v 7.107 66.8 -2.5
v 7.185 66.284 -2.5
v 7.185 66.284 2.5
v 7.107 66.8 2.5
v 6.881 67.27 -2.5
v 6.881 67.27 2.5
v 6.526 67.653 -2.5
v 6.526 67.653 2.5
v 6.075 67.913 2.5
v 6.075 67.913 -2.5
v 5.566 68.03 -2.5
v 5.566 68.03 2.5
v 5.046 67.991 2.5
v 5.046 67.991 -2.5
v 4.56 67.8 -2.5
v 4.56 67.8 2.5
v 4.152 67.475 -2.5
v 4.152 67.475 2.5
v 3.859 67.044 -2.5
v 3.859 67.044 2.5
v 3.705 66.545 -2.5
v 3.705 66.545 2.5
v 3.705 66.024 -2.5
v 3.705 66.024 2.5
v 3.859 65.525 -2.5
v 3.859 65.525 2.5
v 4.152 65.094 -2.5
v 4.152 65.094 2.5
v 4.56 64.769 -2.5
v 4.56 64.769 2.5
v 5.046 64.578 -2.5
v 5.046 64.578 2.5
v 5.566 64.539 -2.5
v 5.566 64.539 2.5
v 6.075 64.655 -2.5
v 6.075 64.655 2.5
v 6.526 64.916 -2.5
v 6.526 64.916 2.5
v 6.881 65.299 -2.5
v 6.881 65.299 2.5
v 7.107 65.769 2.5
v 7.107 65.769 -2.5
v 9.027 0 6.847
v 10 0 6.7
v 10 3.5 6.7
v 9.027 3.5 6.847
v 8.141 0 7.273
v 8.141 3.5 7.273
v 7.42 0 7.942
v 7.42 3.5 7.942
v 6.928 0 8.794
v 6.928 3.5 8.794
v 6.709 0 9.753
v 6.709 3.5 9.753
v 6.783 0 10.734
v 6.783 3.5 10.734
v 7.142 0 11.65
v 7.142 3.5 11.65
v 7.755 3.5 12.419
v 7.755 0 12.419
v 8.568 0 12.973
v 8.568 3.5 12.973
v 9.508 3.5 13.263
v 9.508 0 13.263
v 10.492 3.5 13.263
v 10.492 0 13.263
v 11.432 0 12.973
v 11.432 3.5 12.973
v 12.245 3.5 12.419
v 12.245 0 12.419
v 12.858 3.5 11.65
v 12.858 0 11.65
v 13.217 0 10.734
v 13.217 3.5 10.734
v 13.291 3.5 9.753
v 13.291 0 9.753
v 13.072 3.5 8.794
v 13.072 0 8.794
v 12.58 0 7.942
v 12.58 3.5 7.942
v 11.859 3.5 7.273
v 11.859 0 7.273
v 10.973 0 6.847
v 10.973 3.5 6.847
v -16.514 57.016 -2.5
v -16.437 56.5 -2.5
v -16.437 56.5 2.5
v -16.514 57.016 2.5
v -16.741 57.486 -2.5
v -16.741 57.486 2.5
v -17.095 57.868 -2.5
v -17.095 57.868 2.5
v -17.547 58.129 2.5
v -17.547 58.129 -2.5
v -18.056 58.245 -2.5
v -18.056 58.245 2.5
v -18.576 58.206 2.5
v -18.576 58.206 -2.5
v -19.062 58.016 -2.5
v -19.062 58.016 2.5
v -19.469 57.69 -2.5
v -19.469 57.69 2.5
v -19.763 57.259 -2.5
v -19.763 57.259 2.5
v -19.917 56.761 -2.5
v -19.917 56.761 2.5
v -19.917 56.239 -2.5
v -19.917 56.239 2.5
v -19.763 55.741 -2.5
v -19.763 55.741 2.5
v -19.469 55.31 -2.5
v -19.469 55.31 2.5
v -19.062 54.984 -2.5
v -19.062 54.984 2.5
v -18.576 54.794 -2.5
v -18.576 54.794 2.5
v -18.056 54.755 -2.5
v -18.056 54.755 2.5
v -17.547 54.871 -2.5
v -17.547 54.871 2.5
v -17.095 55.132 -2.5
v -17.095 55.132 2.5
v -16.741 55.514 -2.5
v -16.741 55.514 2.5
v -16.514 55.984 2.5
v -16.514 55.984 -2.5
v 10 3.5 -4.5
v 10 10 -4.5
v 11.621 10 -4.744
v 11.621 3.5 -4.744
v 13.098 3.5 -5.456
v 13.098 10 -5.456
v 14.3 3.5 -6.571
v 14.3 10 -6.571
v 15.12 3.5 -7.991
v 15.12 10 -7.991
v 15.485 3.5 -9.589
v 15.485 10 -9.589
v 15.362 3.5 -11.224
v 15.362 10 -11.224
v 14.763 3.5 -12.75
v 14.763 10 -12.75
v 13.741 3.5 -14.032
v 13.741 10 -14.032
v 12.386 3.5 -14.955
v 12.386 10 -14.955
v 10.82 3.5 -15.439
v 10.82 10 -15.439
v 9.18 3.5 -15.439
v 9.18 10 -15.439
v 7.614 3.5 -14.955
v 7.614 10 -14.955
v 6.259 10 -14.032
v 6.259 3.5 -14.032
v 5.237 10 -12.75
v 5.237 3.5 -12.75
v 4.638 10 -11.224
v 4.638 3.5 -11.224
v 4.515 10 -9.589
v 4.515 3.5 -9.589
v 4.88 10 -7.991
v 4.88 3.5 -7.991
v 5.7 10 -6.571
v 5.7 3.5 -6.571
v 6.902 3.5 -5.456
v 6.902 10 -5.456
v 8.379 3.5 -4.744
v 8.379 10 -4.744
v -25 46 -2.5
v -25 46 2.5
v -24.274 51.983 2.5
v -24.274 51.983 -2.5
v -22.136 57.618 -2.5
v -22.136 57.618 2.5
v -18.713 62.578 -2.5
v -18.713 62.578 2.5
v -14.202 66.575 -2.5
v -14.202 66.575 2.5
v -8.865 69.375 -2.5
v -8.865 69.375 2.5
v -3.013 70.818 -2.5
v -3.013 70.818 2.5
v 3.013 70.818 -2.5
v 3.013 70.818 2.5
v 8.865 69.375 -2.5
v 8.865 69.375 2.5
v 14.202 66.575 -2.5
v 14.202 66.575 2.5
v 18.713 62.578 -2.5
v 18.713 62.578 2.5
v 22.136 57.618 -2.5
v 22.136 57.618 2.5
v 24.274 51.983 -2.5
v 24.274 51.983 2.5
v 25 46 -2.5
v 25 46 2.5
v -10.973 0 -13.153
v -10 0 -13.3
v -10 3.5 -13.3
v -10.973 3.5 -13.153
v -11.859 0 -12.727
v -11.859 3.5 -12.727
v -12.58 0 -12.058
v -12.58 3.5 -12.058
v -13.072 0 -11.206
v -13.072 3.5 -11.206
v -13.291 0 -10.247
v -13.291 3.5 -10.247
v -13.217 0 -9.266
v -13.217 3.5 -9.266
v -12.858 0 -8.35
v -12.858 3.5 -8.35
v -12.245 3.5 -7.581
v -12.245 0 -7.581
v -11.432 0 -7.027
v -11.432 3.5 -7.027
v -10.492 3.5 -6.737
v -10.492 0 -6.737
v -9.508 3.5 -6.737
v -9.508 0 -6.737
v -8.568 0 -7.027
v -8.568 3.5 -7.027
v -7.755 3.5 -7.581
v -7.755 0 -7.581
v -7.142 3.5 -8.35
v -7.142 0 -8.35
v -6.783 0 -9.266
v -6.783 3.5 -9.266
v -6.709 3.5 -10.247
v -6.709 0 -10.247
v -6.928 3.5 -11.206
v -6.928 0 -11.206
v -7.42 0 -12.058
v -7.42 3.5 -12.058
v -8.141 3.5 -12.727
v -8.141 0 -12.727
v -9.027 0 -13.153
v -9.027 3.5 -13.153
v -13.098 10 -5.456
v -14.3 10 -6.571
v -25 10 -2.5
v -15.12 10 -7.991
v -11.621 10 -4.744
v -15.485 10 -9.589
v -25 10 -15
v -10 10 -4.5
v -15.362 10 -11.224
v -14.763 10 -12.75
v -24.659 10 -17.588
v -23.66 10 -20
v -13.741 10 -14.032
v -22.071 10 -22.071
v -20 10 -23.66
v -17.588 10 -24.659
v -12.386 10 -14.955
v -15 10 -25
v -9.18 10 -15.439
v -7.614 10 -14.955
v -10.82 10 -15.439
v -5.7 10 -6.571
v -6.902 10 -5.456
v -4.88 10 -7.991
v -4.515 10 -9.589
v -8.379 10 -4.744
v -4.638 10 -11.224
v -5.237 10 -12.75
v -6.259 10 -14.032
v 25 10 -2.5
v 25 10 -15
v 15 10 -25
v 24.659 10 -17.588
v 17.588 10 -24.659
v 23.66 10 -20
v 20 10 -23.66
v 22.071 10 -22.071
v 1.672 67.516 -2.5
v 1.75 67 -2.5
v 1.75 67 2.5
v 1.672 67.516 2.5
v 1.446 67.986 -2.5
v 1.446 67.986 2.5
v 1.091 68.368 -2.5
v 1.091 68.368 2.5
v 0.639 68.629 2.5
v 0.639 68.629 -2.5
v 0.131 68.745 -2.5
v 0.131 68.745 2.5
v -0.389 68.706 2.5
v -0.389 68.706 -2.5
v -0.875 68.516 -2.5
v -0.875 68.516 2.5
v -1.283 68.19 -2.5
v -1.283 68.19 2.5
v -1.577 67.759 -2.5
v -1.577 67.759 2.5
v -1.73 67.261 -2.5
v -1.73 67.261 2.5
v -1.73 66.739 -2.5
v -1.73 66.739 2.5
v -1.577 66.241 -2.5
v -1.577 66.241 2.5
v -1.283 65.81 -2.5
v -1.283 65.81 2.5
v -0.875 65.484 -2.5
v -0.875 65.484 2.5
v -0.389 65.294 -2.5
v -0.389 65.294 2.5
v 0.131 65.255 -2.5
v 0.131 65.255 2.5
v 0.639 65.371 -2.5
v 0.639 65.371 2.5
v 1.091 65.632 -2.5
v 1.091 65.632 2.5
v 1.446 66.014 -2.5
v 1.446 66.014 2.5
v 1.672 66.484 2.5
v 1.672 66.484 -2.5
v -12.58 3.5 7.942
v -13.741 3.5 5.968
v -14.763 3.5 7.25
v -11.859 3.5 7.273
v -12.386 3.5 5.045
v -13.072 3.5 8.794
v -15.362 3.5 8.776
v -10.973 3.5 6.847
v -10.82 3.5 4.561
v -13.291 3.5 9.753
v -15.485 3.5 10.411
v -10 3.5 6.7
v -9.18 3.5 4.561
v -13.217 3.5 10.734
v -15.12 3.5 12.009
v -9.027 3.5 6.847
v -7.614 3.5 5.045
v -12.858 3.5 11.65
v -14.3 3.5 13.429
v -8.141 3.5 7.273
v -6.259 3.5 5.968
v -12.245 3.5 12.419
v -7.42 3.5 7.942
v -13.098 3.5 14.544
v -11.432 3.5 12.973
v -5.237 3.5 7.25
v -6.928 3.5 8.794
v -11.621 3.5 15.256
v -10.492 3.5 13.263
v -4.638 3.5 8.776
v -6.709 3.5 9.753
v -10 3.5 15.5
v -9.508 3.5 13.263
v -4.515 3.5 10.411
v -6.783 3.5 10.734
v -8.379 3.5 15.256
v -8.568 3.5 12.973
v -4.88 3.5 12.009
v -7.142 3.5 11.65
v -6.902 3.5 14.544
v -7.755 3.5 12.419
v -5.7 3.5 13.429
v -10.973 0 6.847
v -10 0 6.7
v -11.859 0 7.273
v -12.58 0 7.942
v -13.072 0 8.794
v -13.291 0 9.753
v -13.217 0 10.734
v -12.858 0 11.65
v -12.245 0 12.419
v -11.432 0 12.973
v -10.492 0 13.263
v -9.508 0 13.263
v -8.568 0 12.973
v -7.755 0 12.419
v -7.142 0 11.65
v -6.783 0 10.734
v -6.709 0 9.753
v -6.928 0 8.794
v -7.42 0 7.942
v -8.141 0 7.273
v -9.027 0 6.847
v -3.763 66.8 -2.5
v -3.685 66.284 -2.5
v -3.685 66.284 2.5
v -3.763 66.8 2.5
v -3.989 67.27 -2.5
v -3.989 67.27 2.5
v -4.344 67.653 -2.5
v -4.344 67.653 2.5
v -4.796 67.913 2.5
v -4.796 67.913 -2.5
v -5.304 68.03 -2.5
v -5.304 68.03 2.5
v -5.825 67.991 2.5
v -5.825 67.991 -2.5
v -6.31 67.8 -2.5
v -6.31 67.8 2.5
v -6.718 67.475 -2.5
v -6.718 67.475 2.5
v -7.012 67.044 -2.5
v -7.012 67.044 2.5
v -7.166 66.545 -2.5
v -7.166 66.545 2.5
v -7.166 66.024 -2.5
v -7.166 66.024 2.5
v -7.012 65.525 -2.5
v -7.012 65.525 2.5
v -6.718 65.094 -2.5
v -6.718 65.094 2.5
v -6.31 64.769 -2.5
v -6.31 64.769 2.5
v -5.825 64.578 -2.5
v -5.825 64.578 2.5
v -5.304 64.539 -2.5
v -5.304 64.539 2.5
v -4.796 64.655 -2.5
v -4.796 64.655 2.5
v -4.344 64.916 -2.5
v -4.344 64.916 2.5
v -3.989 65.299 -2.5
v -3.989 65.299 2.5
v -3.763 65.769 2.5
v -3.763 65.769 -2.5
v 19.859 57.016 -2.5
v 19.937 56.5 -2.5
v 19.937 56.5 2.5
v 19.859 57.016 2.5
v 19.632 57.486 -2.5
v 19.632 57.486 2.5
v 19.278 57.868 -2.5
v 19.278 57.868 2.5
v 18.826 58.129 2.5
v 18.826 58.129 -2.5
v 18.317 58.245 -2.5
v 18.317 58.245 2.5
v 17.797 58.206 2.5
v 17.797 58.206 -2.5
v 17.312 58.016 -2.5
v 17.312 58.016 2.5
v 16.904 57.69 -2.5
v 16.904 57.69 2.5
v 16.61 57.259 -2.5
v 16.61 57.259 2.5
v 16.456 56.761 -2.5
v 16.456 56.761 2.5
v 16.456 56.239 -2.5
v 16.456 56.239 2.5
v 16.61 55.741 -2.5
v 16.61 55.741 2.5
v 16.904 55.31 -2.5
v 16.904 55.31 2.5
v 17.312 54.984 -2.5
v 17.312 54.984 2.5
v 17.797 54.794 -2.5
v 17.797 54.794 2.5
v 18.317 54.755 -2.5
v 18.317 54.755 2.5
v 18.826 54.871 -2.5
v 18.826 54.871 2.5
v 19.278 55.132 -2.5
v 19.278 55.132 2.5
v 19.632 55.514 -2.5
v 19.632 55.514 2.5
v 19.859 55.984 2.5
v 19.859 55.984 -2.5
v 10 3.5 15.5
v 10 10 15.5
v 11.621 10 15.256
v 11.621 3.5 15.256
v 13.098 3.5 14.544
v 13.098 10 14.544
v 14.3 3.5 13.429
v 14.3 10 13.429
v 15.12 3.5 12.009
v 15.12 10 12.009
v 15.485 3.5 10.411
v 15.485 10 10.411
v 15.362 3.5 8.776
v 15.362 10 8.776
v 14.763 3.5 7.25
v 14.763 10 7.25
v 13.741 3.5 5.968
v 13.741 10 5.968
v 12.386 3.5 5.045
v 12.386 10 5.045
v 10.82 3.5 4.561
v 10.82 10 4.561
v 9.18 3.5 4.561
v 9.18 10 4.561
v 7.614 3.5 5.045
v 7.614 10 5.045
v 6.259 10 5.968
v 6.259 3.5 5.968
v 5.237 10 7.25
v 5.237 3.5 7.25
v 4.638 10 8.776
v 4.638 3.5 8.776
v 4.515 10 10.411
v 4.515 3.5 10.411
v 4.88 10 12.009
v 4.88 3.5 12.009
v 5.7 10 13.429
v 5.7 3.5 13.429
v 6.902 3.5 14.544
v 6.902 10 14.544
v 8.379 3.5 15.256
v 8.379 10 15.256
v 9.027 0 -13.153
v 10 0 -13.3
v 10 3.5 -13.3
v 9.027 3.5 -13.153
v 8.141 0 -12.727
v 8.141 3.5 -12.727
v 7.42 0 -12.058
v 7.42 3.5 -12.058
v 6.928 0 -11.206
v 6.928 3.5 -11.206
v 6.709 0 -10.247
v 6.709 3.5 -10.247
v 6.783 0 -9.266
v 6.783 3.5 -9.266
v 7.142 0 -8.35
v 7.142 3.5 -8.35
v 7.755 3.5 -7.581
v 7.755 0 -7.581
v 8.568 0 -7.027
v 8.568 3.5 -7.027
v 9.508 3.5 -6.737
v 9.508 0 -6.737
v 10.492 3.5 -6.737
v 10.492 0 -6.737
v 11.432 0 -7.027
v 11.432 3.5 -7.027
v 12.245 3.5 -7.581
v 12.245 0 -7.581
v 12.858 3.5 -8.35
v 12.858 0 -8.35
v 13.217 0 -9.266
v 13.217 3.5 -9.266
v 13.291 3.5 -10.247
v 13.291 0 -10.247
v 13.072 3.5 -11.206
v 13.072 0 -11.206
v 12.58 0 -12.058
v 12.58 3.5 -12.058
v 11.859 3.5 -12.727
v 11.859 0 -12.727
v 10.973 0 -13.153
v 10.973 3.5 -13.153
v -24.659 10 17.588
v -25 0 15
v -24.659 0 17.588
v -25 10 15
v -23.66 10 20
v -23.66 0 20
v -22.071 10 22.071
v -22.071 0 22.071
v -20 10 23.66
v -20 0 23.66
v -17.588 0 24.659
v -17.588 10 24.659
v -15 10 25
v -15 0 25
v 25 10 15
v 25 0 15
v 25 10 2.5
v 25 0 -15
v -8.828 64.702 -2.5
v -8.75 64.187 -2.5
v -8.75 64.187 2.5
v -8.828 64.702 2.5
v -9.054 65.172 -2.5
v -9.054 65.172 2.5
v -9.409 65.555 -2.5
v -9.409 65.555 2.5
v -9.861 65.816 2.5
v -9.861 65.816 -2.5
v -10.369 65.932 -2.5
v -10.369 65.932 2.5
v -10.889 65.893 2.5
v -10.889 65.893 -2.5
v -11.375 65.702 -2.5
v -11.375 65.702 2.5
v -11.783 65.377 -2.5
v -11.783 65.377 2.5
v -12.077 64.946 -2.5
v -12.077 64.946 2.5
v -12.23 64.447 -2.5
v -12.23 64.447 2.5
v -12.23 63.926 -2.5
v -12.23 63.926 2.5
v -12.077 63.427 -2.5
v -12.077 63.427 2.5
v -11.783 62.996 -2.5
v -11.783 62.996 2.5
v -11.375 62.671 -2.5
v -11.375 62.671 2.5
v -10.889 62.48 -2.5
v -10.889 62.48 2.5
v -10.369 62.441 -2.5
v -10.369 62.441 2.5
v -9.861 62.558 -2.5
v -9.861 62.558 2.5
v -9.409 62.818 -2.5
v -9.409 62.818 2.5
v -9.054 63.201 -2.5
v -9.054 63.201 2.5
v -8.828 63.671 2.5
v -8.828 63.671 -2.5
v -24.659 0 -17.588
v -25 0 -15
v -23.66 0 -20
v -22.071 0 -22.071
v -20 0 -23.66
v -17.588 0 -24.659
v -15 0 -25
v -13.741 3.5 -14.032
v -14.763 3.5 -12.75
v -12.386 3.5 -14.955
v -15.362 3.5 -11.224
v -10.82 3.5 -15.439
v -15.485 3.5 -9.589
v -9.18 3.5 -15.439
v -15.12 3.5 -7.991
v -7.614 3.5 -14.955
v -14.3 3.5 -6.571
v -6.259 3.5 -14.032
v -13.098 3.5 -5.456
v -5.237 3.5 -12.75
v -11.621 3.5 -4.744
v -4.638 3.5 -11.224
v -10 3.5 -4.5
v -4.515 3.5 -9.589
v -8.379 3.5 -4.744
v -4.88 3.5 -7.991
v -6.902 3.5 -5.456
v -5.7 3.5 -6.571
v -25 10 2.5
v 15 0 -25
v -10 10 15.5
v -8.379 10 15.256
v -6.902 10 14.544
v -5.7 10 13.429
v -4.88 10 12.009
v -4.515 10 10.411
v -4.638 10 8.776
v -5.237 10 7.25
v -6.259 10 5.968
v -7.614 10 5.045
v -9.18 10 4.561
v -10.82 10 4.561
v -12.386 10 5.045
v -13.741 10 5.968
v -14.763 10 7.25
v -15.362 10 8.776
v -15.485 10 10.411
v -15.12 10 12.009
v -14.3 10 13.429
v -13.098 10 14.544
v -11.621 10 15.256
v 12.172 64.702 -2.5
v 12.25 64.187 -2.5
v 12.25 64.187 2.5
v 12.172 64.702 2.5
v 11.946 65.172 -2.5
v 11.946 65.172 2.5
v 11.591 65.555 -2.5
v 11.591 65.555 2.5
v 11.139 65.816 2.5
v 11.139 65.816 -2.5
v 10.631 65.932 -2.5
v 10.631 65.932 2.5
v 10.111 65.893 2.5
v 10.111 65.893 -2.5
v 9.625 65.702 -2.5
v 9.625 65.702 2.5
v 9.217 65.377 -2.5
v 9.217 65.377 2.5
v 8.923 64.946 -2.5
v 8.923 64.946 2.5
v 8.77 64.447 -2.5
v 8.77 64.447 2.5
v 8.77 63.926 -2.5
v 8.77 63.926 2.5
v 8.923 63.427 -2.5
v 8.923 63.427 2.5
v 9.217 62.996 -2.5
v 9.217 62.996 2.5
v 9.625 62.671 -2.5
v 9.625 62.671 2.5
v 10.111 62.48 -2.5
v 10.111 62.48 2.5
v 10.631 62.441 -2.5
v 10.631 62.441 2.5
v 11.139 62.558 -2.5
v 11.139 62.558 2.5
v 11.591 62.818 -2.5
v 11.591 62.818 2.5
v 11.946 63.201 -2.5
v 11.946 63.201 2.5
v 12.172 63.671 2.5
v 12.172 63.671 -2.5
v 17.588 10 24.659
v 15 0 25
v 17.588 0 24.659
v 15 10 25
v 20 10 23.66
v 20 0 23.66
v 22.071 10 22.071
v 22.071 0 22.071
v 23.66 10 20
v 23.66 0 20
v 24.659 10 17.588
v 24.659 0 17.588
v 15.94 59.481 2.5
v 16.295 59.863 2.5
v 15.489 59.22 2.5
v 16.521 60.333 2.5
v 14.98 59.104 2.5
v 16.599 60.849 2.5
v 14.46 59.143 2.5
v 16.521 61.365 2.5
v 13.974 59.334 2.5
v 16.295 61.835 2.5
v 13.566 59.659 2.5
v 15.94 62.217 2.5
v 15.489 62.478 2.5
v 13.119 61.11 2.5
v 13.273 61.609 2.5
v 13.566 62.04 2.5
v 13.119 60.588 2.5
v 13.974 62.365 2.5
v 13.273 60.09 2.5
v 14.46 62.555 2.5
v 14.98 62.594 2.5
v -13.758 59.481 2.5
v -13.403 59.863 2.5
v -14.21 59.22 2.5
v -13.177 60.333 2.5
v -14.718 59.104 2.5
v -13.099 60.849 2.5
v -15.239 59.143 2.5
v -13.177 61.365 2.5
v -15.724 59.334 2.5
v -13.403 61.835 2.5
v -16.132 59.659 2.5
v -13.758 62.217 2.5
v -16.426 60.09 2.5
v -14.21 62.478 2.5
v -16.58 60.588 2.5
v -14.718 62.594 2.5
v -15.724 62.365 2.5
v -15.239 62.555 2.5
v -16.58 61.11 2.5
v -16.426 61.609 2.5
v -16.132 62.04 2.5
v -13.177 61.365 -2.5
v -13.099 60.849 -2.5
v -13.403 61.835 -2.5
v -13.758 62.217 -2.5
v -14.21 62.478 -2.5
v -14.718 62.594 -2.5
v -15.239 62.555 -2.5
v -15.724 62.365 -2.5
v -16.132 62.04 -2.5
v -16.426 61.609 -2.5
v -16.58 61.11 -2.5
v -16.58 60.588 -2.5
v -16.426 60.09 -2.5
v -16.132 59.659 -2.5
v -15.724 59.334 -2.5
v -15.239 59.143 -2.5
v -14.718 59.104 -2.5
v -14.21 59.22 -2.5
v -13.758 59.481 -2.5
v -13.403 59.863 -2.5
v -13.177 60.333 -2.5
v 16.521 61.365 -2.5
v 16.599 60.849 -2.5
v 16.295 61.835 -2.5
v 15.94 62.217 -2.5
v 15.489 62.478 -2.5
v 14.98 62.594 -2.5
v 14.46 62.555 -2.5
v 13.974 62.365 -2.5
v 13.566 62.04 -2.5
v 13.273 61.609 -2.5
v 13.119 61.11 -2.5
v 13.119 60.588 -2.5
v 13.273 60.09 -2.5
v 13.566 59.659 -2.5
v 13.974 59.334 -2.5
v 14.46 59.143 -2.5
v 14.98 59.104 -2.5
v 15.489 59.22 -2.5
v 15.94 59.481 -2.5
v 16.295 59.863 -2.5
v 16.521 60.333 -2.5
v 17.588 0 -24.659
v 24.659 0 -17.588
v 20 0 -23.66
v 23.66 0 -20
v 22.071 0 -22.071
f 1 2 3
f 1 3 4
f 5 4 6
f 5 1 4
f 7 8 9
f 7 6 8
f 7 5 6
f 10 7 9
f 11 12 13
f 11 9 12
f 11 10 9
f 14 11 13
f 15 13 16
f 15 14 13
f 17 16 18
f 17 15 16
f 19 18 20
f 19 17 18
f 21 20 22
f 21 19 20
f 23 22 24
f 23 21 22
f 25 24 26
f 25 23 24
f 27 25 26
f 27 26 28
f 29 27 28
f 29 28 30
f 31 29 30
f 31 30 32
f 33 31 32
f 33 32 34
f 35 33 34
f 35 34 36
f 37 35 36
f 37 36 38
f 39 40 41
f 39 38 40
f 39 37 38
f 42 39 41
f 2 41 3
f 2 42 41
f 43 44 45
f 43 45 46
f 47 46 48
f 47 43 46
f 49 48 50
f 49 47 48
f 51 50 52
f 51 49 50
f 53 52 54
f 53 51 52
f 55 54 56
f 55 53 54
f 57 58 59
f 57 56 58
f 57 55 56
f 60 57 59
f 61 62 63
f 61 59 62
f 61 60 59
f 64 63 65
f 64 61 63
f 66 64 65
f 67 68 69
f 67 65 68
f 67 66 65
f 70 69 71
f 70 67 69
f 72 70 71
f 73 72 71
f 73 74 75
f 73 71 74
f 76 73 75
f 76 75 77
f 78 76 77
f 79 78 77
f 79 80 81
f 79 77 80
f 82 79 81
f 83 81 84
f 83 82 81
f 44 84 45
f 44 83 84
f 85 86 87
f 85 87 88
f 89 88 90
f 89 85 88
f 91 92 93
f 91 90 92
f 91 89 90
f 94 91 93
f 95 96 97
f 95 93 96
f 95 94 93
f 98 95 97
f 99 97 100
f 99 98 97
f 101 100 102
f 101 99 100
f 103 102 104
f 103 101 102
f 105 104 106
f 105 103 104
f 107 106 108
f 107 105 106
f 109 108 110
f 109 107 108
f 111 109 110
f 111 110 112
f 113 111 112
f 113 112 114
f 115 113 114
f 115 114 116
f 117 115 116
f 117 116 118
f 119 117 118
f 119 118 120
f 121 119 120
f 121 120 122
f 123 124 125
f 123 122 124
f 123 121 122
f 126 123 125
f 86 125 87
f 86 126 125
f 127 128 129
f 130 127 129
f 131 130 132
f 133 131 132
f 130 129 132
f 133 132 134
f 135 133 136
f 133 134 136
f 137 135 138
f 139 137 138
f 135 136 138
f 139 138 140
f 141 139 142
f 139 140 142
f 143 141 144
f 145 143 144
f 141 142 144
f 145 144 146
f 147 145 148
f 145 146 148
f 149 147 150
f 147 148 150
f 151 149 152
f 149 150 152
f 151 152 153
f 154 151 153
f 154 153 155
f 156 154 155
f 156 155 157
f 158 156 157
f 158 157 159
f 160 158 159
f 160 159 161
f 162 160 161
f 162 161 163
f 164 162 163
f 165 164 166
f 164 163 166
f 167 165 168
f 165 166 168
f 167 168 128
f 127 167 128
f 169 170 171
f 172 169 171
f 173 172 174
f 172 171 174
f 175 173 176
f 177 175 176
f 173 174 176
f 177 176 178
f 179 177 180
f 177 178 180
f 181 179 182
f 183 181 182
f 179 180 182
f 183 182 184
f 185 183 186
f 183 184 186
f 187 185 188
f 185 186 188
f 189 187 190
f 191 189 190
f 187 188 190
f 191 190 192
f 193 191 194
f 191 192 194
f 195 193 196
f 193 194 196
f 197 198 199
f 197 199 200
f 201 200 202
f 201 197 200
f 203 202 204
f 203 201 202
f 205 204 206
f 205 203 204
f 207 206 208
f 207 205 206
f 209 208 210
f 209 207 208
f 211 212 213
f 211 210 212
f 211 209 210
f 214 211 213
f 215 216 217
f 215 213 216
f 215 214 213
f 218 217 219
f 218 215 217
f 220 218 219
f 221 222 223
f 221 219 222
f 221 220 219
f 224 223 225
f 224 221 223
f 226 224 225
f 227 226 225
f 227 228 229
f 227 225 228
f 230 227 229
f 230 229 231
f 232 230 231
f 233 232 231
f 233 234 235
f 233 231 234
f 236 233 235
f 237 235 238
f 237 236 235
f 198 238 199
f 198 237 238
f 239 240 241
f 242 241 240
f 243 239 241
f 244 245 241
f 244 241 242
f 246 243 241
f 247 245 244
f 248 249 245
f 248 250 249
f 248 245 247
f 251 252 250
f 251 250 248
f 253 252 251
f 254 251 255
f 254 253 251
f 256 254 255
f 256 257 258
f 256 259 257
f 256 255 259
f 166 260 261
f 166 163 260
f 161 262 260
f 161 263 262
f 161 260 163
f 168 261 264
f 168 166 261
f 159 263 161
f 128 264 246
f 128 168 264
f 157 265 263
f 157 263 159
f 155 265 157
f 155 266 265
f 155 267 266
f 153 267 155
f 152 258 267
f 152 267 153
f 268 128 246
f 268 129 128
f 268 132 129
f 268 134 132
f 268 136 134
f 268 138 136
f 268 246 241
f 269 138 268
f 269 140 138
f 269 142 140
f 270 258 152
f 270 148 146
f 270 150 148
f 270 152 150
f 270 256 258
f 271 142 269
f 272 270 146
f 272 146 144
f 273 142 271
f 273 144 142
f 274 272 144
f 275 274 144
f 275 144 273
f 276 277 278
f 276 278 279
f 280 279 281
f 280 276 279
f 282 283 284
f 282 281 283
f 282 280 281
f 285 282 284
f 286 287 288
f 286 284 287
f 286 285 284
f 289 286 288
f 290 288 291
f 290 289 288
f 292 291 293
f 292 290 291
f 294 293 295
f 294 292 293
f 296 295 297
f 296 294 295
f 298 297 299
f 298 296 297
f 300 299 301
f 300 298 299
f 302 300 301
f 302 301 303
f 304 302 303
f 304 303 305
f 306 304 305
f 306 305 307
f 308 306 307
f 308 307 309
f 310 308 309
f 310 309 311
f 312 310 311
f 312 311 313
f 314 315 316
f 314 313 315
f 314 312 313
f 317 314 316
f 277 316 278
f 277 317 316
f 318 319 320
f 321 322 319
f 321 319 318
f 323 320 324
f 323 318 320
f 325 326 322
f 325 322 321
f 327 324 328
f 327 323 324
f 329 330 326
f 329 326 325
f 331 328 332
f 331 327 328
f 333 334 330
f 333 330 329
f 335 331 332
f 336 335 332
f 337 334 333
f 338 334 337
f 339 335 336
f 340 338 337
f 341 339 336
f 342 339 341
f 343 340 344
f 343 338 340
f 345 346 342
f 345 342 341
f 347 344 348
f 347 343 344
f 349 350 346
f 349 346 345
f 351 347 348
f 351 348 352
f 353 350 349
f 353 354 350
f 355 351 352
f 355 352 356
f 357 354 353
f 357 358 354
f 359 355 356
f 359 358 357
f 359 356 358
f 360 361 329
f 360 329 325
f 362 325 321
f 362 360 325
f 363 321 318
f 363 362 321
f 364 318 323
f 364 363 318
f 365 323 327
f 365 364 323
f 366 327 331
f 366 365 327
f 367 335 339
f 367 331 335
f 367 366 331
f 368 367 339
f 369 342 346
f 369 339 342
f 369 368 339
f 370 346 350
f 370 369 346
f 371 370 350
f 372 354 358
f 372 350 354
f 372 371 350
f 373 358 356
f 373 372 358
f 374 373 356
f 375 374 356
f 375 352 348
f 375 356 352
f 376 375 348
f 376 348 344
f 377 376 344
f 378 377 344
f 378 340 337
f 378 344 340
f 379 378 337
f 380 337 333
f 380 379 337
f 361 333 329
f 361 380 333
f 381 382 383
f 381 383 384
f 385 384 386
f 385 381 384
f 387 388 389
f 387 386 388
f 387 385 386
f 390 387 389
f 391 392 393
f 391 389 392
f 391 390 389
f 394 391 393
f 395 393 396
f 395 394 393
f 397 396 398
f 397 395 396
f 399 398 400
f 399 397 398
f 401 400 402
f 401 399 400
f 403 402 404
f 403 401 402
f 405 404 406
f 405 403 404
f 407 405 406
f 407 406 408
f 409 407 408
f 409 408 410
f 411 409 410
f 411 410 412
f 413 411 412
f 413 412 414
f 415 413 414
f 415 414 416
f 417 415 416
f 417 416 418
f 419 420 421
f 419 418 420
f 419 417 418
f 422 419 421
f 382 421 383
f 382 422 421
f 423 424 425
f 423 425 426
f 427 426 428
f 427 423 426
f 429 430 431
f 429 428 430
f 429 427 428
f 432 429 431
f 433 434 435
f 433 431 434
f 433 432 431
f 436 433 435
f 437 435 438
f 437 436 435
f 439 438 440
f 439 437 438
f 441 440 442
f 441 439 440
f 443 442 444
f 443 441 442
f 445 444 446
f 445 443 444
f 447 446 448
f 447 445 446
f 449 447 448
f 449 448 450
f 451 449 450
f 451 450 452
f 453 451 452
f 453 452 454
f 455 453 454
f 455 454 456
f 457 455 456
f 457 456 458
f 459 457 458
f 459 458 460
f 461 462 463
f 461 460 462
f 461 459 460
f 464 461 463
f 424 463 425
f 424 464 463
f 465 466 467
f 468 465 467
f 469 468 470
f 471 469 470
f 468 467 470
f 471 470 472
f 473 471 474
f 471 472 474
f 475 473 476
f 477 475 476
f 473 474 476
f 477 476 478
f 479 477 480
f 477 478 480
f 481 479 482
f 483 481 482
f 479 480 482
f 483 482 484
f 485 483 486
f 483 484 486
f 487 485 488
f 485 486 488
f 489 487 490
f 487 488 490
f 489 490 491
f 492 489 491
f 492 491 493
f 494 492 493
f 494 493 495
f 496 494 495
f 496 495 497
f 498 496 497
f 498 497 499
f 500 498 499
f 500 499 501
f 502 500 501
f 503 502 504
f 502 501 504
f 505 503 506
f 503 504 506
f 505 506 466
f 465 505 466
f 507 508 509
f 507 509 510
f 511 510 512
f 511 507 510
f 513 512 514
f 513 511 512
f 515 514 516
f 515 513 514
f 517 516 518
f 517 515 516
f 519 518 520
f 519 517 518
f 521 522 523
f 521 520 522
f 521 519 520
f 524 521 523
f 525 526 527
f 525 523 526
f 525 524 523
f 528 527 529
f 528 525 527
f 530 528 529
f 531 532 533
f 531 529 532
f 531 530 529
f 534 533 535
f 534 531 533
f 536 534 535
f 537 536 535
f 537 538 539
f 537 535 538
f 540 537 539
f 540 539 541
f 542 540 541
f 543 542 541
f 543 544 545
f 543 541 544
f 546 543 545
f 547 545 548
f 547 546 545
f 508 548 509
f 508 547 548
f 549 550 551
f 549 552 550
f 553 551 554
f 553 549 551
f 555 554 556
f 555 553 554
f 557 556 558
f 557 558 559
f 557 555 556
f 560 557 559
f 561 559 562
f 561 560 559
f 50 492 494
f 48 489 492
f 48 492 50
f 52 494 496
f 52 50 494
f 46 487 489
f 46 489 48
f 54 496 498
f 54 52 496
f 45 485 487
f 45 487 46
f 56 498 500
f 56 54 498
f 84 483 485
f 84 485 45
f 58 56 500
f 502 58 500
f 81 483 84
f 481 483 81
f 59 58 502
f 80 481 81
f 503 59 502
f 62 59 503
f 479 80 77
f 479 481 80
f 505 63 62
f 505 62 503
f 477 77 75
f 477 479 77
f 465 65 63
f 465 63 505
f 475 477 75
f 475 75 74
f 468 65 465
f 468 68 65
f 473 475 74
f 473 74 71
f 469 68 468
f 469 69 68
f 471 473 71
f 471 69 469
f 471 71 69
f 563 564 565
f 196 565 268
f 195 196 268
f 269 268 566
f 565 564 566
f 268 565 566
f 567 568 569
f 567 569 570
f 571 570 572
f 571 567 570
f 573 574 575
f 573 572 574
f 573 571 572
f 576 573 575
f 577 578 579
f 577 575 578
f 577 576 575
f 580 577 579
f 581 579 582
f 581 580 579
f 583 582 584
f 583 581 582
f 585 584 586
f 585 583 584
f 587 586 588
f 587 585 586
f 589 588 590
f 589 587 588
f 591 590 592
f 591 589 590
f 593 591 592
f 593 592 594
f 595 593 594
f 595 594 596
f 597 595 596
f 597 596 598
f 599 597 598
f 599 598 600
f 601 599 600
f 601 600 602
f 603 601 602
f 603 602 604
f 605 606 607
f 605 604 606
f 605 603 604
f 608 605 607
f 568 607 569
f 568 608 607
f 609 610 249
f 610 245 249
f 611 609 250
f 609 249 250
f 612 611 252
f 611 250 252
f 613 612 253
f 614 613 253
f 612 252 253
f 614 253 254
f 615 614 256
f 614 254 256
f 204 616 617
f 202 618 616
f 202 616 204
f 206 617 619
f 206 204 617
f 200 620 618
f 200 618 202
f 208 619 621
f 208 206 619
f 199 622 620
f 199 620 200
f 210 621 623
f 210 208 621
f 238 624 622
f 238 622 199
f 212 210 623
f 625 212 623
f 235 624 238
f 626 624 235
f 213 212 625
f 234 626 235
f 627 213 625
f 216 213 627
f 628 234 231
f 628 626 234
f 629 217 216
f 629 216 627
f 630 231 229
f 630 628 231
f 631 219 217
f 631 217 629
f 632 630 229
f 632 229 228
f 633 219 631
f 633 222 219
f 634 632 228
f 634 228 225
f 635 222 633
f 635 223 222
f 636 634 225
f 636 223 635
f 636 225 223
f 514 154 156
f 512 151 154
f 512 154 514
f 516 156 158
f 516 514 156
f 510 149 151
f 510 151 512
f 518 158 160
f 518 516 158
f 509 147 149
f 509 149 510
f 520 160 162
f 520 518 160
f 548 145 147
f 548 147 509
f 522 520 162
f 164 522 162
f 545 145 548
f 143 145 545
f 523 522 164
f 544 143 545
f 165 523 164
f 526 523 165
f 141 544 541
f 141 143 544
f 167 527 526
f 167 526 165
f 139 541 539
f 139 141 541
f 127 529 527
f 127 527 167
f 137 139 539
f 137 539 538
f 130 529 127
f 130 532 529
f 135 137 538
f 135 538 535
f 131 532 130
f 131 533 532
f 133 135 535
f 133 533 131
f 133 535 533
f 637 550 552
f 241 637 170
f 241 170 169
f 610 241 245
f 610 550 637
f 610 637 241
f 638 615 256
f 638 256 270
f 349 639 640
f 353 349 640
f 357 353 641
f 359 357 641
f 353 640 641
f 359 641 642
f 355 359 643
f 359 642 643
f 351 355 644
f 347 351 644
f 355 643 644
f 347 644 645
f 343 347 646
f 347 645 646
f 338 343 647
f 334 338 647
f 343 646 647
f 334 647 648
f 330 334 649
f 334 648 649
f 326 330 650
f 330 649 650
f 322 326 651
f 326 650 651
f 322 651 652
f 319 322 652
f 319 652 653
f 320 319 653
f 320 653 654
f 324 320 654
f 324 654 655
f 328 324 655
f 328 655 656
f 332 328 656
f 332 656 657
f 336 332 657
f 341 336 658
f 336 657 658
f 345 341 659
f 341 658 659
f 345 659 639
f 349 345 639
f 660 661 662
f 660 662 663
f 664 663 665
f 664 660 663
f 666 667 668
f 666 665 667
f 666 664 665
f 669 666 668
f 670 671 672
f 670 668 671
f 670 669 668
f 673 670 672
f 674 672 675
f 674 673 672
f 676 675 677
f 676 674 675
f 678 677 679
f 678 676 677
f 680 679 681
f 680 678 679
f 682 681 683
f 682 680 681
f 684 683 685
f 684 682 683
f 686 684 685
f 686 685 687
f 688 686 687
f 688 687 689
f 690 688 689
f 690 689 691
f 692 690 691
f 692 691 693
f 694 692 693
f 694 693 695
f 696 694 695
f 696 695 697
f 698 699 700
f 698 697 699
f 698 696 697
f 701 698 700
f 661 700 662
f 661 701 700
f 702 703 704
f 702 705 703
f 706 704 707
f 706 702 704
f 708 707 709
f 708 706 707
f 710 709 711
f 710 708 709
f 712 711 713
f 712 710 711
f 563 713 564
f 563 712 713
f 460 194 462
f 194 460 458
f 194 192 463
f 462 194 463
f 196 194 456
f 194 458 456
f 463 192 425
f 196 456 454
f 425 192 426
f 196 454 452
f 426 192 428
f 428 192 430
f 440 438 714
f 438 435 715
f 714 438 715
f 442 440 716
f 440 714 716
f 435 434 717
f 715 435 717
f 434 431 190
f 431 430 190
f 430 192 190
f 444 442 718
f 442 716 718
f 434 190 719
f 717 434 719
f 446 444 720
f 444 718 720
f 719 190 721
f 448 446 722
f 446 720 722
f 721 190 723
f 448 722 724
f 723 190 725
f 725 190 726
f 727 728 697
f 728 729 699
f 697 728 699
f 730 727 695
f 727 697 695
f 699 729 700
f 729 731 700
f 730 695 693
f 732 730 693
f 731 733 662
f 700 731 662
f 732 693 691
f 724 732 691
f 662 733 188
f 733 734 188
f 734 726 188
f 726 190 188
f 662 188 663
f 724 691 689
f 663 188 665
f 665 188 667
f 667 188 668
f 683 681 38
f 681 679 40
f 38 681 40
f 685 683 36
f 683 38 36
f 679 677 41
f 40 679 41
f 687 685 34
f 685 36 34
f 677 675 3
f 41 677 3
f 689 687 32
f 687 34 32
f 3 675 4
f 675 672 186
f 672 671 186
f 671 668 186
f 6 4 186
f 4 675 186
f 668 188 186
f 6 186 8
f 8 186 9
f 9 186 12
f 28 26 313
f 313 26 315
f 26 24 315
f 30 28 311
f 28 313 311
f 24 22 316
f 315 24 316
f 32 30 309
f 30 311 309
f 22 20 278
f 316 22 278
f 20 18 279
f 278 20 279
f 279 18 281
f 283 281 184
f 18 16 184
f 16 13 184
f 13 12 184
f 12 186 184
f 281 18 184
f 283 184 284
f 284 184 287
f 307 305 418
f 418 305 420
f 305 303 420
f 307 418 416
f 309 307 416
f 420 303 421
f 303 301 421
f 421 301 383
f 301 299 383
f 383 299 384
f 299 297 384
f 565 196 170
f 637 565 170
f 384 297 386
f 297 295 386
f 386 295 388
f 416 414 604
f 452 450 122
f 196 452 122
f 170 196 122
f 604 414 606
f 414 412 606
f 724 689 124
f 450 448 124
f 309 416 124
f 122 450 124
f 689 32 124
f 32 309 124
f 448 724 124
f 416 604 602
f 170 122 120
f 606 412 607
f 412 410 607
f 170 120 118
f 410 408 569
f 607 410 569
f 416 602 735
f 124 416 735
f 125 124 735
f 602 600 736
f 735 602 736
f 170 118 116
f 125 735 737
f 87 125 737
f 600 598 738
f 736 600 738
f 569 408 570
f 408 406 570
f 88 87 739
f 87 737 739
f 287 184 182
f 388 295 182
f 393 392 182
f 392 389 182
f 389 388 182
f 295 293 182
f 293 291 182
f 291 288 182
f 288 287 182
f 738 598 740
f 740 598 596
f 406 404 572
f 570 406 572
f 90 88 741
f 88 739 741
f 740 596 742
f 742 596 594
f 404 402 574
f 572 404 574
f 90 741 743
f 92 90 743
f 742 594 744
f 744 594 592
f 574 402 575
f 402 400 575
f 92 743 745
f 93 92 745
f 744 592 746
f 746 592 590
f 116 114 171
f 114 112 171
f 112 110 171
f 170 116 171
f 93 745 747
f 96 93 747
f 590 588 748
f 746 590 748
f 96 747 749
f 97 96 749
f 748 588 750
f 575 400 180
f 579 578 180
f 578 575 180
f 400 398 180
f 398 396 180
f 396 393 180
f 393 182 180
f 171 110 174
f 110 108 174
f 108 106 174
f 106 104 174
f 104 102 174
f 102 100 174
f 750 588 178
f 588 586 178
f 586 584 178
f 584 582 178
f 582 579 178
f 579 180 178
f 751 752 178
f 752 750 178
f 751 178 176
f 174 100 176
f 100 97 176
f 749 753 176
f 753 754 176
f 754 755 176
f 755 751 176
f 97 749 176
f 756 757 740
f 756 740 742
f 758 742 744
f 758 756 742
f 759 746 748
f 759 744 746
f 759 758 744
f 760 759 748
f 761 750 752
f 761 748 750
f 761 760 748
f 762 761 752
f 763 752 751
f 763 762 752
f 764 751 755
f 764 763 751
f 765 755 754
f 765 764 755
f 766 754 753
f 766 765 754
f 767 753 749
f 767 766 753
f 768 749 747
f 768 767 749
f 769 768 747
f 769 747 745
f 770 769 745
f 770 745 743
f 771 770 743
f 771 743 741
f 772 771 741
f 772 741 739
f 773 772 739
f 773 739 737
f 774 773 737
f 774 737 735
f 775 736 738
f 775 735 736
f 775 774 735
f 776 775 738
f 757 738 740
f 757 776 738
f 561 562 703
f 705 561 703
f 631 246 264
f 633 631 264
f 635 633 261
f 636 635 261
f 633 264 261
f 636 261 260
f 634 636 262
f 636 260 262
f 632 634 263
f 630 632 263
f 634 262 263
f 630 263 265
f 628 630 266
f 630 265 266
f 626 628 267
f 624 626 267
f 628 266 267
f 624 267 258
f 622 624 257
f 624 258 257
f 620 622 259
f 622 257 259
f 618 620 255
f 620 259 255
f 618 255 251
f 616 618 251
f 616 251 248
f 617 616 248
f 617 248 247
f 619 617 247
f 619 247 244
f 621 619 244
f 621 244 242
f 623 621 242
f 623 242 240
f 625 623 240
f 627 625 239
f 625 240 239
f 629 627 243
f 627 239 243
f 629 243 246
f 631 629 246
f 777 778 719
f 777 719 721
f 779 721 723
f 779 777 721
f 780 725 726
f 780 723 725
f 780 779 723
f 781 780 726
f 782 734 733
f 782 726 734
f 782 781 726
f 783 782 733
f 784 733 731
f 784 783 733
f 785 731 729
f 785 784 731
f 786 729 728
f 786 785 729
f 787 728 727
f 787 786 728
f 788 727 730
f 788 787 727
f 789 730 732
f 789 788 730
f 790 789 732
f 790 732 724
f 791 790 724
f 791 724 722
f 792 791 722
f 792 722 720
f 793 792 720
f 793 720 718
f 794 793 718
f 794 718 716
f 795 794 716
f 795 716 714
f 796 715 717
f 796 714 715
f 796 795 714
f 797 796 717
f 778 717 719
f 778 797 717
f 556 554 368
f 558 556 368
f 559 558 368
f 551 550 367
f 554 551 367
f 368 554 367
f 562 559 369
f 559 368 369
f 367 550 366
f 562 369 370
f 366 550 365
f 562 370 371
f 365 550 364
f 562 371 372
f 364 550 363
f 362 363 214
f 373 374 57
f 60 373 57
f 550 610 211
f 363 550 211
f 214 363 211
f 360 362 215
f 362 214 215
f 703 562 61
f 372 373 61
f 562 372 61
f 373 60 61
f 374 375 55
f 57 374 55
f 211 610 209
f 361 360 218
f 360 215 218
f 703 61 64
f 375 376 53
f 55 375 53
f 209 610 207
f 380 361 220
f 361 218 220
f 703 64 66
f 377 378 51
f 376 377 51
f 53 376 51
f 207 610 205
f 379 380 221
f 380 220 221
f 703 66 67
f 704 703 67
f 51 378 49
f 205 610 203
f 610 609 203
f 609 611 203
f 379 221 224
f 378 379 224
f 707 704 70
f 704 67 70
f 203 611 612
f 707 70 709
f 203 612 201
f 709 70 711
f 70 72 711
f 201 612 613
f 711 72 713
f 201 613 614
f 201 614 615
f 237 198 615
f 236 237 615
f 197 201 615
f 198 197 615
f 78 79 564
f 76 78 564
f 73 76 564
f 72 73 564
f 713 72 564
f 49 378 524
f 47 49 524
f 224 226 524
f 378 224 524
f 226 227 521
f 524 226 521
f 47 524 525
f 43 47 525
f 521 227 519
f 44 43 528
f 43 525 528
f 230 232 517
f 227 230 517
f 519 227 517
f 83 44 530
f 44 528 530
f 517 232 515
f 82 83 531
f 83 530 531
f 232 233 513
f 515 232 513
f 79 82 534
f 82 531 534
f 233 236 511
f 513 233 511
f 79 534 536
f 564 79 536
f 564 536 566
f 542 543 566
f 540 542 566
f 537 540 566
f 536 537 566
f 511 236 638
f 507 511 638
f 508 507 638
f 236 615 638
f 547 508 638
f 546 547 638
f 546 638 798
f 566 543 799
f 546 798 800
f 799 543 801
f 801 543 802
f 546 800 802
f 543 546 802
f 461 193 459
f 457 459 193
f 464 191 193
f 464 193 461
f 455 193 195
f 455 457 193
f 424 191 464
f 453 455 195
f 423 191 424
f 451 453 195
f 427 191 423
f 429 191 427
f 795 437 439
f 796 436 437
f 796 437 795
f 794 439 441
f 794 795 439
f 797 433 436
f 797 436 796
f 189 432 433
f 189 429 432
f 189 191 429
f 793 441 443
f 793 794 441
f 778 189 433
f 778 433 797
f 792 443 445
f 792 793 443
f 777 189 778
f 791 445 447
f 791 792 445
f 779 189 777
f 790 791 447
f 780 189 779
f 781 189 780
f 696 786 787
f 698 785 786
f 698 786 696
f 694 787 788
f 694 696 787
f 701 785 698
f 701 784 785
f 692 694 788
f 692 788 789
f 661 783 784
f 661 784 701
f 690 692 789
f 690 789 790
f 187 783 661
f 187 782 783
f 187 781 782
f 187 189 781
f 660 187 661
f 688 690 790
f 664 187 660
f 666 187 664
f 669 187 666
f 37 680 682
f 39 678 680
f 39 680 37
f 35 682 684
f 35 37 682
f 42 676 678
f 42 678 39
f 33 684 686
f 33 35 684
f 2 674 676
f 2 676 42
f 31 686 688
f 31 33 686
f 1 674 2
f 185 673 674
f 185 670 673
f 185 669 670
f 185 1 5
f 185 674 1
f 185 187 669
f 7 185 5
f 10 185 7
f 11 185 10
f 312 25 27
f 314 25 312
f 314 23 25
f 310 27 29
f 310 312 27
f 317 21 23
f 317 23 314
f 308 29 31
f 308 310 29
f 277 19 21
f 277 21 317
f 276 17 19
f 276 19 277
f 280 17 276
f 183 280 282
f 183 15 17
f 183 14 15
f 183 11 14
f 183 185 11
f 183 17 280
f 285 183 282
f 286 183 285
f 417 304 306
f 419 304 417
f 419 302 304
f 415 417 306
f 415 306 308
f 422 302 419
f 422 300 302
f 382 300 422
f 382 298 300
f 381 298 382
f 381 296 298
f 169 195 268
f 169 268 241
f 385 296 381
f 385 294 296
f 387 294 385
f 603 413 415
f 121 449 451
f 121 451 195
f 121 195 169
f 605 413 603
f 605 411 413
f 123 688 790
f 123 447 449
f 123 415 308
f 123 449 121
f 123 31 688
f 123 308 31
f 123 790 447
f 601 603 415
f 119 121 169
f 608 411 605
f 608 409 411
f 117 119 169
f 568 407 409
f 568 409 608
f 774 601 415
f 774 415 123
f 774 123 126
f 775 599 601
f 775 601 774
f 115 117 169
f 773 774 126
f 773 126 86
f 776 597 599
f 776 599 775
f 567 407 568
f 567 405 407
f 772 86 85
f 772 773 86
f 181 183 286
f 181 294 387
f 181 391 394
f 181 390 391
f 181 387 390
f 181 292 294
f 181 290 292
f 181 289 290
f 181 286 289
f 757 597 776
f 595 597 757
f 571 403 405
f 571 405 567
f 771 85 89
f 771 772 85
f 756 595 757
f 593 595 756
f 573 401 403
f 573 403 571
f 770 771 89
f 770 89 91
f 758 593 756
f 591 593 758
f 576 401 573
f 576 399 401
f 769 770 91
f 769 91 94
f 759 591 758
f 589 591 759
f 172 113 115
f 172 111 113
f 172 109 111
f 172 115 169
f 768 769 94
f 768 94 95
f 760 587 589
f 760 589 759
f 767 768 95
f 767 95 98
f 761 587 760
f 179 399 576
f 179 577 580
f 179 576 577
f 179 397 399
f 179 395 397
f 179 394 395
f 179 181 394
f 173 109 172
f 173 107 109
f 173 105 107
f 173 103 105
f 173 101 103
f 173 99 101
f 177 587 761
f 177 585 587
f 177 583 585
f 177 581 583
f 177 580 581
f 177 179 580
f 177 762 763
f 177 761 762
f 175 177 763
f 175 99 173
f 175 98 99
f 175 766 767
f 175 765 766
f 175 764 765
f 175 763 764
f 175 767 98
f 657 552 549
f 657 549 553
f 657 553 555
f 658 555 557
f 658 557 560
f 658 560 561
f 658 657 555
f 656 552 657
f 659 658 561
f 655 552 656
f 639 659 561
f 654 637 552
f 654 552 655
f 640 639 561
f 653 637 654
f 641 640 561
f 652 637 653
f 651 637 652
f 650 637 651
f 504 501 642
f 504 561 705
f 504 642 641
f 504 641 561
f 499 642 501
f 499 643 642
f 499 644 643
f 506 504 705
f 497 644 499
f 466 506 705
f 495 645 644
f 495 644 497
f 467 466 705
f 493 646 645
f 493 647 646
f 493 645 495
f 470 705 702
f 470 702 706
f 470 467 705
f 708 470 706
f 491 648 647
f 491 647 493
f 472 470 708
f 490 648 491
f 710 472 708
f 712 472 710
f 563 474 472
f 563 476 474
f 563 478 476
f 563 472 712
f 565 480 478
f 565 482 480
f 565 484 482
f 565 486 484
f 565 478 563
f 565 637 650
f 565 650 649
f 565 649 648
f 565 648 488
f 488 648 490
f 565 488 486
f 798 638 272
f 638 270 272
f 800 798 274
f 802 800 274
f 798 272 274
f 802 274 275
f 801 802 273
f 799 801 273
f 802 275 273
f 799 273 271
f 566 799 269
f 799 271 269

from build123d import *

# Parameters (mm, degrees)
SKETCH_1_W               = 50
SKETCH_1_H               = 50
EXTRUDE_1_DEPTH          = 10
EXTRUDE_2_DEPTH          = 2.5
CUT_EXTRUDE_1_DEPTH      = 80.315824398
CUT_EXTRUDE_1_DEPTH_BACK = 80.315824398
SKETCH_5_R               = 1.75
CUT_EXTRUDE_3_DEPTH      = 80.315824398
CUT_EXTRUDE_3_DEPTH_BACK = 5
SKETCH_6_R               = 3.3
FILLET_1_R               = 10
SKETCH_8_R               = 5.5
CUT_EXTRUDE_5_DEPTH      = 6.5


with BuildPart() as part:
    # ｽｹｯﾁ1 → ﾎﾞｽ - 押し出し1 (new body)
    with BuildSketch(Plane(origin=(0, 0, 0), x_dir=(1, 0, 0), z_dir=(0, 1, 0))):
        Rectangle(SKETCH_1_W, SKETCH_1_H)
    extrude(amount=EXTRUDE_1_DEPTH)

    # ｽｹｯﾁ2 → ﾎﾞｽ - 押し出し2 (add, symmetric)
    with BuildSketch(Plane.XY):
        with BuildLine():
            Line((25, 46), (25, 10))
            Line((25, 10), (-25, 10))
            Line((-25, 10), (-25, 46))
            ThreePointArc((-25, 46), (0, 71), (25, 46))
        make_face()
    extrude(amount=EXTRUDE_2_DEPTH, both=True)

    # ｽｹｯﾁ5 → ｶｯﾄ - 押し出し1 (cut, two sides: drawn at the far end of the back side and taken through both)
    with BuildSketch(Plane.XY.offset(-CUT_EXTRUDE_1_DEPTH_BACK)):
        with Locations((0, 67)):
            Circle(SKETCH_5_R)
        with Locations((5.435199947, 66.284442352)):
            Circle(SKETCH_5_R)
        with Locations((10.5, 64.186533479)):
            Circle(SKETCH_5_R)
        with Locations((14.849242405, 60.849242405)):
            Circle(SKETCH_5_R)
        with Locations((18.186533479, 56.5)):
            Circle(SKETCH_5_R)
        with Locations((-18.186533479, 56.5)):
            Circle(SKETCH_5_R)
        with Locations((-14.849242405, 60.849242405)):
            Circle(SKETCH_5_R)
        with Locations((-10.5, 64.186533479)):
            Circle(SKETCH_5_R)
        with Locations((-5.435199947, 66.284442352)):
            Circle(SKETCH_5_R)
    extrude(amount=CUT_EXTRUDE_1_DEPTH + CUT_EXTRUDE_1_DEPTH_BACK, mode=Mode.SUBTRACT)

    # ｽｹｯﾁ6 → ｶｯﾄ - 押し出し3 (cut, two sides: drawn at the far end of the back side and taken through both)
    with BuildSketch(Plane(origin=(0, 0, 0), x_dir=(1, 0, 0), z_dir=(0, 1, 0)).offset(-CUT_EXTRUDE_3_DEPTH_BACK)):
        with Locations(Location((-10, -10, 0), (0, 0, 90))):
            Circle(SKETCH_6_R)
        with Locations(Location((10, -10, 0), (0, 0, 90))):
            Circle(SKETCH_6_R)
        with Locations(Location((10, 10, 0), (0, 0, 90))):
            Circle(SKETCH_6_R)
        with Locations(Location((-10, 10, 0), (0, 0, 90))):
            Circle(SKETCH_6_R)
    extrude(amount=CUT_EXTRUDE_3_DEPTH + CUT_EXTRUDE_3_DEPTH_BACK, mode=Mode.SUBTRACT)

    # ﾌｨﾚｯﾄ1
    fillet_1_edges = [part.edges().sort_by_distance(p)[0] for p in [
        (-25, 5, 25),
        (-25, 5, -25),
        (25, 5, -25),
        (25, 5, 25),
    ]]
    fillet(fillet_1_edges, radius=FILLET_1_R)

    # ｽｹｯﾁ8 → ｶｯﾄ - 押し出し5 (cut)
    with BuildSketch(Plane(origin=(0, 10, 0), x_dir=(1, 0, 0), z_dir=(0, 1, 0))):
        with Locations(Location((-10, -10, 0), (0, 0, 270))):
            Circle(SKETCH_8_R)
        with Locations(Location((10, -10, 0), (0, 0, 270))):
            Circle(SKETCH_8_R)
        with Locations(Location((10, 10, 0), (0, 0, 270))):
            Circle(SKETCH_8_R)
        with Locations(Location((-10, 10, 0), (0, 0, 270))):
            Circle(SKETCH_8_R)
    extrude(amount=-CUT_EXTRUDE_5_DEPTH, mode=Mode.SUBTRACT)


solid = part.part
